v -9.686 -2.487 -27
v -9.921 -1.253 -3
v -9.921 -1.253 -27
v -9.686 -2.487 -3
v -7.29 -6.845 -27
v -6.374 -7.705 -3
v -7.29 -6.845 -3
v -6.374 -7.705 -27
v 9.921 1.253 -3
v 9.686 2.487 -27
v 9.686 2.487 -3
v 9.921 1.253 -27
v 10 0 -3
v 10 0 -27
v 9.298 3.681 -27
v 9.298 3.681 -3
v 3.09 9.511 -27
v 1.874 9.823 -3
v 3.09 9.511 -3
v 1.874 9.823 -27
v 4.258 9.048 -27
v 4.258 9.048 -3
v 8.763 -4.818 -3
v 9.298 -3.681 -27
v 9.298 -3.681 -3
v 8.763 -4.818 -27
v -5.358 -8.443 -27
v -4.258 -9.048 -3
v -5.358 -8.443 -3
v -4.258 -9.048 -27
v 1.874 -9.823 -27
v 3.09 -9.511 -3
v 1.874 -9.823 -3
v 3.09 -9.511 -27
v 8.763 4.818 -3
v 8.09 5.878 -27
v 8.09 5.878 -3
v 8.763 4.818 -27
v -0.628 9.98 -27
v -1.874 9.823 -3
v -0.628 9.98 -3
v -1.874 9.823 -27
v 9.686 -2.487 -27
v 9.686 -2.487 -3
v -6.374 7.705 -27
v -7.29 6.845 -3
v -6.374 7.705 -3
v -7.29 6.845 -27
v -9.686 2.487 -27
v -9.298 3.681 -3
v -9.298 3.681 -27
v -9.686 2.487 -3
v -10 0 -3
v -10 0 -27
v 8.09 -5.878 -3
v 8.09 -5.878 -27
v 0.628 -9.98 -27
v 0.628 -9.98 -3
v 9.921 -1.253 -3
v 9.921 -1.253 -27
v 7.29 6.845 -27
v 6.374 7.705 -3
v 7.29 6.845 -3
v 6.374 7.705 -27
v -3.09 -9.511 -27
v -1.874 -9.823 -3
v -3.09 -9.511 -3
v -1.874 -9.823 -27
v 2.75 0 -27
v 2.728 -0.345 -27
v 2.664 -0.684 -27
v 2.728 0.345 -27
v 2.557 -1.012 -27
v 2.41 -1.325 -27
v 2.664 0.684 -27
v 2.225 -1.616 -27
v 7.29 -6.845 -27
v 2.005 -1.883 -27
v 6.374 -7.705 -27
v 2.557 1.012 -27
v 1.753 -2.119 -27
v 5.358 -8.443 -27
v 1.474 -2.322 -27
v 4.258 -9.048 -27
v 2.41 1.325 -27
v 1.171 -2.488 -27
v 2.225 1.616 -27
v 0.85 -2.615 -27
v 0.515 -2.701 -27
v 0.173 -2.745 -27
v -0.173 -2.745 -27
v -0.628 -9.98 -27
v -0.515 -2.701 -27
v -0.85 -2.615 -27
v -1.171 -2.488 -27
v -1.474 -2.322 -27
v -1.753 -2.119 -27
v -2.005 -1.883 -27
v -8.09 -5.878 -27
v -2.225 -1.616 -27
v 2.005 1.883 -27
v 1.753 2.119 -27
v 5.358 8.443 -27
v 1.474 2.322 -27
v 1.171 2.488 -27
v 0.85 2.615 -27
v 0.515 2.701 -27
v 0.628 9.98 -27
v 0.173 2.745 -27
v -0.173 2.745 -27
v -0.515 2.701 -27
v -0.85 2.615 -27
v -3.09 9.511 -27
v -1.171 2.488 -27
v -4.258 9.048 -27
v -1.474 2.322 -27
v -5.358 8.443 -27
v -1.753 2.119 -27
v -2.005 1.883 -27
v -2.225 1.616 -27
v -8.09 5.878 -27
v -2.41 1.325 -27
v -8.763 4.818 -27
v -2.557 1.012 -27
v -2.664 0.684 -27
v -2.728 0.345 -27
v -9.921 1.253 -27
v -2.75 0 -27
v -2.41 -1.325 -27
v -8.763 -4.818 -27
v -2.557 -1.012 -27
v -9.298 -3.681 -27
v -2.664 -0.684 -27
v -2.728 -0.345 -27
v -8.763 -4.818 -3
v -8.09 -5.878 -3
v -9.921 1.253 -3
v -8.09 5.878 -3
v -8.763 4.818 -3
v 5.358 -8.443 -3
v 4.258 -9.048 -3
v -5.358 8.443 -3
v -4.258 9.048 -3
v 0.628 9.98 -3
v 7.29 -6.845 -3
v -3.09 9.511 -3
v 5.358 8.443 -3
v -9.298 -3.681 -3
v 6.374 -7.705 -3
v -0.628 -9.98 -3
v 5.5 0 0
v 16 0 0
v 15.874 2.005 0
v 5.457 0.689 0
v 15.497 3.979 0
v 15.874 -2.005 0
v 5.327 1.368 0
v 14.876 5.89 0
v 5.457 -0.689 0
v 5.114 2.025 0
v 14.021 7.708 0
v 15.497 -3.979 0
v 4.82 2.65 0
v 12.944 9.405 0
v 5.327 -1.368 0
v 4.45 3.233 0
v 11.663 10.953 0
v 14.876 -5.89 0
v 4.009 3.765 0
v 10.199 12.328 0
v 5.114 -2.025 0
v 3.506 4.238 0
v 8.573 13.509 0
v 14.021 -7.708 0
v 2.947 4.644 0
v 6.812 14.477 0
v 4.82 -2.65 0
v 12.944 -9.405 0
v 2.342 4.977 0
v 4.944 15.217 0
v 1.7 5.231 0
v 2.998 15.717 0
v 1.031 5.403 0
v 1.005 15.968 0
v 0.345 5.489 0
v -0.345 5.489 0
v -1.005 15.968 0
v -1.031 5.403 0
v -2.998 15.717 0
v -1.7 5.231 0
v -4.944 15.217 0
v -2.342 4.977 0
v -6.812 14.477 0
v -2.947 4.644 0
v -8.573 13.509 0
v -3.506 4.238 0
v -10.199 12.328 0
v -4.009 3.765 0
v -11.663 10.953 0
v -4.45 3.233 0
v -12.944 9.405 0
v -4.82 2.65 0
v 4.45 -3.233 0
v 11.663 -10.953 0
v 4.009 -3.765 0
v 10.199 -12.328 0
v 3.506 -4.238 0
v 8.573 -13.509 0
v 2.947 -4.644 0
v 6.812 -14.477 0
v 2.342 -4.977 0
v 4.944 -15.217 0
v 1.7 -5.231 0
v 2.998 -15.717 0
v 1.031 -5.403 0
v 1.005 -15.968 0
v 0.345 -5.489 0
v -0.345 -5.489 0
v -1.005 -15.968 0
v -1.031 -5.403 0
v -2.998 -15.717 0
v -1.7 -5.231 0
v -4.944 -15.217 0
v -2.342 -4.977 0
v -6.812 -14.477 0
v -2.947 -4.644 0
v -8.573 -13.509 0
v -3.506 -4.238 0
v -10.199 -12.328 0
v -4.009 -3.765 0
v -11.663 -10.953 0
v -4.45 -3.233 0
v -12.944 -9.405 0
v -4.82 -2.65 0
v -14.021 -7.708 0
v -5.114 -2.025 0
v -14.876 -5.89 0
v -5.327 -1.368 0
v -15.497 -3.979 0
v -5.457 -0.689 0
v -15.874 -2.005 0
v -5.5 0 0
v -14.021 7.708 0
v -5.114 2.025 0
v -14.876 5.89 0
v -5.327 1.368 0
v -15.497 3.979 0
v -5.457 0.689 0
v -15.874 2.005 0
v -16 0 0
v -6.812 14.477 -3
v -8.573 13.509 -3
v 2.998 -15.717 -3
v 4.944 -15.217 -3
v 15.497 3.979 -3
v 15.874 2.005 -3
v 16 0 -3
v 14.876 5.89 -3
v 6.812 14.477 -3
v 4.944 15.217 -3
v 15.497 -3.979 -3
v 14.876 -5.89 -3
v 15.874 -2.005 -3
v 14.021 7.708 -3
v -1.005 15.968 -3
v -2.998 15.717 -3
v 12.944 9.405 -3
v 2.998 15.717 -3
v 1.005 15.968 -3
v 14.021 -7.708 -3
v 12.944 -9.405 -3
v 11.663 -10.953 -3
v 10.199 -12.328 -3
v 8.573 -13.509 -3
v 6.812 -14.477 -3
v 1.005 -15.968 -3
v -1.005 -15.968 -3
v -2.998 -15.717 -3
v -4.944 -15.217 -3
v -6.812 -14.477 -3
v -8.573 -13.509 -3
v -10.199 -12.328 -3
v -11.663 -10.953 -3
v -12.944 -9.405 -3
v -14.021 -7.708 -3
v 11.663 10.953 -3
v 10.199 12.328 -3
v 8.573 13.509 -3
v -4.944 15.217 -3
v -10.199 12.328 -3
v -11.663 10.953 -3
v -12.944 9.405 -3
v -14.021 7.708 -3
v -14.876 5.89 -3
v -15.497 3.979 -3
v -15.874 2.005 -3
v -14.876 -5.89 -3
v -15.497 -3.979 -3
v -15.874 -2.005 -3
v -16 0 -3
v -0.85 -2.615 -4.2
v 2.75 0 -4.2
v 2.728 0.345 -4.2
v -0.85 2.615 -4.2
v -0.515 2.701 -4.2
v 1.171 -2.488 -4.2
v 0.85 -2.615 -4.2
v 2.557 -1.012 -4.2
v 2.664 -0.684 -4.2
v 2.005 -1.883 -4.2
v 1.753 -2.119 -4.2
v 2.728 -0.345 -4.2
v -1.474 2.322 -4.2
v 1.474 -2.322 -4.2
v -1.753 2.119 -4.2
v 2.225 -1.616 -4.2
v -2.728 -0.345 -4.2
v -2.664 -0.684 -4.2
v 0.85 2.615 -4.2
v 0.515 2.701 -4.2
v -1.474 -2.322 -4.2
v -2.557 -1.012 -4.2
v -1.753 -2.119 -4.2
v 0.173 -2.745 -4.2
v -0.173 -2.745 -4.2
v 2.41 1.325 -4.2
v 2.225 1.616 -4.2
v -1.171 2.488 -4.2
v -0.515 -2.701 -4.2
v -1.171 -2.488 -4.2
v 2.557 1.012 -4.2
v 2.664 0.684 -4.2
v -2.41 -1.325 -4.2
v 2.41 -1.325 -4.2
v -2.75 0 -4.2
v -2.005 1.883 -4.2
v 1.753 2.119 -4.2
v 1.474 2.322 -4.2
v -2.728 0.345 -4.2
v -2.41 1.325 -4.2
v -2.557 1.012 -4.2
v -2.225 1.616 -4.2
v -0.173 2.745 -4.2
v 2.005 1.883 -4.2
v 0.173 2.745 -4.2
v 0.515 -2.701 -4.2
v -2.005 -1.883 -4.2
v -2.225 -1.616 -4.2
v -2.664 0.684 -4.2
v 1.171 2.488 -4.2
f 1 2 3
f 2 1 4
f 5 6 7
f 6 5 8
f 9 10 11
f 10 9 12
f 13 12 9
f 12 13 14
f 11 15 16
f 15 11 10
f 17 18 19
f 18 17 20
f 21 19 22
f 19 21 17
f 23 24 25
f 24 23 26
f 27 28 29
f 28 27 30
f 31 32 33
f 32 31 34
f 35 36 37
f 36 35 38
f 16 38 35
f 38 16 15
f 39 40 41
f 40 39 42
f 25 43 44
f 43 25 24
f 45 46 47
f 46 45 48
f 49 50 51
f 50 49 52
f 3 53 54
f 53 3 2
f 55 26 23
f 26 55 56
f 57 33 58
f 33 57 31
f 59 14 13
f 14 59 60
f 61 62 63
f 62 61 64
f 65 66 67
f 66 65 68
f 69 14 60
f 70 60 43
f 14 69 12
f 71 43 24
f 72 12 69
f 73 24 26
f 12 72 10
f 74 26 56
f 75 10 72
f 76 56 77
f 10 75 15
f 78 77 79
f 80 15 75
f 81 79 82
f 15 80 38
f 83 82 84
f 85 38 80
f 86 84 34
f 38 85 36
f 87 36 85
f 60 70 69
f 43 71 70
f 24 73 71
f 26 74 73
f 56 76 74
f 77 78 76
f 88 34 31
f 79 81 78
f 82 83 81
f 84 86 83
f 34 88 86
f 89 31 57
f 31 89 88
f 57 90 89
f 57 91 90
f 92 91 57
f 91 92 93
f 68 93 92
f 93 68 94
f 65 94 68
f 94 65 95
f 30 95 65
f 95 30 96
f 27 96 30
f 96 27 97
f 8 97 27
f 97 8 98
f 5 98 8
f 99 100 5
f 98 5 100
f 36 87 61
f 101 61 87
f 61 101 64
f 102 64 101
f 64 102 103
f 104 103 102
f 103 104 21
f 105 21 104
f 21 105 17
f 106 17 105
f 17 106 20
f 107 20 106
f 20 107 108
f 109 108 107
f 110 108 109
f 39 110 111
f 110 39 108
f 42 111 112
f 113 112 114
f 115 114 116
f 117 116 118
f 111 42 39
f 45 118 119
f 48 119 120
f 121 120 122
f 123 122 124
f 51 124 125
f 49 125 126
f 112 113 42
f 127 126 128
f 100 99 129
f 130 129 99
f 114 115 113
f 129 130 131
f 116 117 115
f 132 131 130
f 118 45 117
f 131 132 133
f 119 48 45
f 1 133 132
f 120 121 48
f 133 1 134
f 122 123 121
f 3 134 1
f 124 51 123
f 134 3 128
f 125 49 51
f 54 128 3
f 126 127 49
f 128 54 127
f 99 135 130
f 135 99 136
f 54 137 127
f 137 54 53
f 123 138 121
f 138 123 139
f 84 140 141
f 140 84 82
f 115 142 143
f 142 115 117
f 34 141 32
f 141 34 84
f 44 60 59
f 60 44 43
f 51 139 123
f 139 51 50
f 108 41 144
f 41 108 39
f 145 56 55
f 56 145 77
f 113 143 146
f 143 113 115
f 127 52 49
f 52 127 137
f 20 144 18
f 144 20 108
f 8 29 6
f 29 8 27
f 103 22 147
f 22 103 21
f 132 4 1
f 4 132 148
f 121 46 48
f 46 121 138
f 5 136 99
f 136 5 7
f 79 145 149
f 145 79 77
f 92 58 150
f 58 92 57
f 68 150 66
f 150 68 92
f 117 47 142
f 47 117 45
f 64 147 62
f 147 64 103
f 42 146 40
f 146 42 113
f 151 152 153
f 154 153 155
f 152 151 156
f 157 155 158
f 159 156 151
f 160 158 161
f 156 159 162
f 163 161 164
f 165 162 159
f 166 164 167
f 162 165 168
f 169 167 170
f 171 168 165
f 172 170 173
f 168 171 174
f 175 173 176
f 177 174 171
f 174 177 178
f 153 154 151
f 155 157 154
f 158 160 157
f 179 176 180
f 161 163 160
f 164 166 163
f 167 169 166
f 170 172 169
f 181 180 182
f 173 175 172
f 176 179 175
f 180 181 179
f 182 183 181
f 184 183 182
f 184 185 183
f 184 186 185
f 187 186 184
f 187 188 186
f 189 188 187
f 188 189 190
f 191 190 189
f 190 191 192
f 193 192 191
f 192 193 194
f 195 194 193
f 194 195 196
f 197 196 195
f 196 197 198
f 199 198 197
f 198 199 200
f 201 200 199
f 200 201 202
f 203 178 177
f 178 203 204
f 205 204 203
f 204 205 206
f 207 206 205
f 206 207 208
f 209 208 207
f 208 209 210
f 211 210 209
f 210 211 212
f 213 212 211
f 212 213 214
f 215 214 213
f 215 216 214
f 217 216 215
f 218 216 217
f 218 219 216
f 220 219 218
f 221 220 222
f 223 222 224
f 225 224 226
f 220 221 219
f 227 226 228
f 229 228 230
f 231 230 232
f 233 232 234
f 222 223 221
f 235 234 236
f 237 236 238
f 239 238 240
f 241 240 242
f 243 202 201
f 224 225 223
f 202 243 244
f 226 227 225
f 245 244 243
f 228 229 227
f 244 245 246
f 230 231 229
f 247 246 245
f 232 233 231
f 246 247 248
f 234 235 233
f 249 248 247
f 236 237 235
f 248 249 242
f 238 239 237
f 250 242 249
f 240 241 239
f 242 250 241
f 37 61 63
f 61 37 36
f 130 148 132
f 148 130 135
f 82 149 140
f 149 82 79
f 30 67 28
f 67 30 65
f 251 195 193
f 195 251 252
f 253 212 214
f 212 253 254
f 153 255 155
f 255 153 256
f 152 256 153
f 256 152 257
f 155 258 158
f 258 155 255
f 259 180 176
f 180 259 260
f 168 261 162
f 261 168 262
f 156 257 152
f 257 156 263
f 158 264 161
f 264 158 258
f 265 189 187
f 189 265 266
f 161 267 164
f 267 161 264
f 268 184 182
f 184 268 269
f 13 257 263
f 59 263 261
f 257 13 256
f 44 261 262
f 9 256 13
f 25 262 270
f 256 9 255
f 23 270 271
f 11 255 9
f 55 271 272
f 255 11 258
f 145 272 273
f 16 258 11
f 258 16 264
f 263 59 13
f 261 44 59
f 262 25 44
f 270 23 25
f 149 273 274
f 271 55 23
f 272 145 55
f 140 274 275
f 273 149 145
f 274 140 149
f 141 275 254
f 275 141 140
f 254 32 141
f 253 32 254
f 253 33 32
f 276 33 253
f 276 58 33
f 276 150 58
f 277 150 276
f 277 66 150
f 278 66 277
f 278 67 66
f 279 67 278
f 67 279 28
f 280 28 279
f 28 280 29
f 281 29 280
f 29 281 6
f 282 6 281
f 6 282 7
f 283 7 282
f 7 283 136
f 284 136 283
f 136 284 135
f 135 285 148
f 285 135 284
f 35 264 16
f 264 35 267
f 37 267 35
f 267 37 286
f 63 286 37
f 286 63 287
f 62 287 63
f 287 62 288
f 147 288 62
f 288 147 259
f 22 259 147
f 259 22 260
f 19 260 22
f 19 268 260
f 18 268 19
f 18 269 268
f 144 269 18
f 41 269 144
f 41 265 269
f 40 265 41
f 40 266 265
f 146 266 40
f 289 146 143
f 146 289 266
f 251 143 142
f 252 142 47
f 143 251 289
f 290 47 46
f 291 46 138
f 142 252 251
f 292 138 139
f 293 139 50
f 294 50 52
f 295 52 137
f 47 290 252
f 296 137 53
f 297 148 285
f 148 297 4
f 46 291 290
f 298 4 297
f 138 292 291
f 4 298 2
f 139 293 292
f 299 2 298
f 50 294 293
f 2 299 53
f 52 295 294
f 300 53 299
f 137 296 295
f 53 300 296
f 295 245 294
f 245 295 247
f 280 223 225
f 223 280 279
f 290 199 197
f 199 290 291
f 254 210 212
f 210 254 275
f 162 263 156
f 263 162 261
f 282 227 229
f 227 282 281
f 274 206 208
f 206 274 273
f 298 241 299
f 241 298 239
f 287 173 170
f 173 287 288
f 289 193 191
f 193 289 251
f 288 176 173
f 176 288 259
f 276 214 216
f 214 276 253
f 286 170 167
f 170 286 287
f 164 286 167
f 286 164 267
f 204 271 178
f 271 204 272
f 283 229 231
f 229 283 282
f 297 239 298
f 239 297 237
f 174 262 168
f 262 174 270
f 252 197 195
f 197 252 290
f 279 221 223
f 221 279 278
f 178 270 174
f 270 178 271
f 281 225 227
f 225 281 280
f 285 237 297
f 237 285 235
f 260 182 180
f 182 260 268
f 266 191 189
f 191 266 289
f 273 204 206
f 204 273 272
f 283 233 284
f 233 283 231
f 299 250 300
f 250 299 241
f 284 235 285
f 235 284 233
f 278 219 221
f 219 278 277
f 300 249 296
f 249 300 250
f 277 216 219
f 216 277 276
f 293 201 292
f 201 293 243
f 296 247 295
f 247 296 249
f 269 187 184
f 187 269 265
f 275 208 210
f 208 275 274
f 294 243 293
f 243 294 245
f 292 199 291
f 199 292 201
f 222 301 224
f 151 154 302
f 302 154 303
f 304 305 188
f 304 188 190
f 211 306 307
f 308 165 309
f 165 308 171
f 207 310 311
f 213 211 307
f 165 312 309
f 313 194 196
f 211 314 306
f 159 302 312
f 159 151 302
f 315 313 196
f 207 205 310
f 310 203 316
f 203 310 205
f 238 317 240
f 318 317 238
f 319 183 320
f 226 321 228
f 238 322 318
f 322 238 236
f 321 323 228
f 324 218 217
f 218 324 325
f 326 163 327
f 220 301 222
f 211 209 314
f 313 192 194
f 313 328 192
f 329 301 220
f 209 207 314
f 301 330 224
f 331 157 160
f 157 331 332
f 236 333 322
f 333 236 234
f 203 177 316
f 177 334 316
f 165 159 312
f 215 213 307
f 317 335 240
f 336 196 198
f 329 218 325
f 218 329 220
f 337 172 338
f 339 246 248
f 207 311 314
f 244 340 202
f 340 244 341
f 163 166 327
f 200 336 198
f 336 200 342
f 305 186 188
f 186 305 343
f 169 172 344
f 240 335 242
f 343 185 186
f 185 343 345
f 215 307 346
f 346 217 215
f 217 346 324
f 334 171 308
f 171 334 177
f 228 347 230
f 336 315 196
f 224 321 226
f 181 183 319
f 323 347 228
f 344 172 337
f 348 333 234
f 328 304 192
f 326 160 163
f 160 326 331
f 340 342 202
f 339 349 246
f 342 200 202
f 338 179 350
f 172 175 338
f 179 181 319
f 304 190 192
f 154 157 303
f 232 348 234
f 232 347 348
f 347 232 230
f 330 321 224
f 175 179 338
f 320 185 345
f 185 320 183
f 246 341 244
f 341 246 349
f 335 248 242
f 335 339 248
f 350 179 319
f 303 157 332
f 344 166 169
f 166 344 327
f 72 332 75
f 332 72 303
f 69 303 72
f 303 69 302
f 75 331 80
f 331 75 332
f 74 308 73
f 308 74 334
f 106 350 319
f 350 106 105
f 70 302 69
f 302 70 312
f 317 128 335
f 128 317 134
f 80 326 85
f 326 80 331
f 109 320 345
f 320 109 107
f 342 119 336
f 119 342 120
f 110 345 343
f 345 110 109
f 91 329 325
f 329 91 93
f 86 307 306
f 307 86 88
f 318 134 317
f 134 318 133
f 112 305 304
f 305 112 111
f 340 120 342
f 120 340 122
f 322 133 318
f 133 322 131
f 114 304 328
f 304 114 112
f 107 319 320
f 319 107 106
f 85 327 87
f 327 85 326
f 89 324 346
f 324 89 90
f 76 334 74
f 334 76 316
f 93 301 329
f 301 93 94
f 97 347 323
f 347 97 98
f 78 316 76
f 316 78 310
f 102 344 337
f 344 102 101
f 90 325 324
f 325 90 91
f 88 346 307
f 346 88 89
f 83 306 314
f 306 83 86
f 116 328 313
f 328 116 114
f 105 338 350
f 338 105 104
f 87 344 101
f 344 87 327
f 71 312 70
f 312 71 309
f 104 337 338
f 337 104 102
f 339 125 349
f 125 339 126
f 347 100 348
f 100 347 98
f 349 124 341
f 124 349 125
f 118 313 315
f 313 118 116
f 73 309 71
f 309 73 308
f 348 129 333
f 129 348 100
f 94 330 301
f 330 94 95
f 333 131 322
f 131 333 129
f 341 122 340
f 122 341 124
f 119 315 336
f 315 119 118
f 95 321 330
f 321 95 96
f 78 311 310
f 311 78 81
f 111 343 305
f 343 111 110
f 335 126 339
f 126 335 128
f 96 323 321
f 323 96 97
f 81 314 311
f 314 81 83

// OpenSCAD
$fn = 50;


difference() {
	union() {
		translate(v = [0, 0, -27.0000000000]) {
			cylinder(h = 27, r = 10.0000000000);
		}
		translate(v = [0, 0, -3.0000000000]) {
			cylinder(h = 3, r = 16.0000000000);
		}
	}
	union() {
		translate(v = [0, 0, 0]) {
			rotate(a = [0, 0, 0]) {
				difference() {
					union() {
						#translate(v = [0, 0, -27.0000000000]) {
							cylinder(h = 27, r = 2.2500000000);
						}
						#translate(v = [0, 0, -4.2000000000]) {
							cylinder(h = 4.2000000000, r = 10.0000000000, r1 = 2.7500000000, r2 = 5.5000000000);
						}
						#translate(v = [0, 0, -27.0000000000]) {
							cylinder(h = 27, r = 2.7500000000);
						}
						#translate(v = [0, 0, -27.0000000000]) {
							cylinder(h = 27, r = 2.2500000000);
						}
					}
					union();
				}
			}
		}
	}
}
